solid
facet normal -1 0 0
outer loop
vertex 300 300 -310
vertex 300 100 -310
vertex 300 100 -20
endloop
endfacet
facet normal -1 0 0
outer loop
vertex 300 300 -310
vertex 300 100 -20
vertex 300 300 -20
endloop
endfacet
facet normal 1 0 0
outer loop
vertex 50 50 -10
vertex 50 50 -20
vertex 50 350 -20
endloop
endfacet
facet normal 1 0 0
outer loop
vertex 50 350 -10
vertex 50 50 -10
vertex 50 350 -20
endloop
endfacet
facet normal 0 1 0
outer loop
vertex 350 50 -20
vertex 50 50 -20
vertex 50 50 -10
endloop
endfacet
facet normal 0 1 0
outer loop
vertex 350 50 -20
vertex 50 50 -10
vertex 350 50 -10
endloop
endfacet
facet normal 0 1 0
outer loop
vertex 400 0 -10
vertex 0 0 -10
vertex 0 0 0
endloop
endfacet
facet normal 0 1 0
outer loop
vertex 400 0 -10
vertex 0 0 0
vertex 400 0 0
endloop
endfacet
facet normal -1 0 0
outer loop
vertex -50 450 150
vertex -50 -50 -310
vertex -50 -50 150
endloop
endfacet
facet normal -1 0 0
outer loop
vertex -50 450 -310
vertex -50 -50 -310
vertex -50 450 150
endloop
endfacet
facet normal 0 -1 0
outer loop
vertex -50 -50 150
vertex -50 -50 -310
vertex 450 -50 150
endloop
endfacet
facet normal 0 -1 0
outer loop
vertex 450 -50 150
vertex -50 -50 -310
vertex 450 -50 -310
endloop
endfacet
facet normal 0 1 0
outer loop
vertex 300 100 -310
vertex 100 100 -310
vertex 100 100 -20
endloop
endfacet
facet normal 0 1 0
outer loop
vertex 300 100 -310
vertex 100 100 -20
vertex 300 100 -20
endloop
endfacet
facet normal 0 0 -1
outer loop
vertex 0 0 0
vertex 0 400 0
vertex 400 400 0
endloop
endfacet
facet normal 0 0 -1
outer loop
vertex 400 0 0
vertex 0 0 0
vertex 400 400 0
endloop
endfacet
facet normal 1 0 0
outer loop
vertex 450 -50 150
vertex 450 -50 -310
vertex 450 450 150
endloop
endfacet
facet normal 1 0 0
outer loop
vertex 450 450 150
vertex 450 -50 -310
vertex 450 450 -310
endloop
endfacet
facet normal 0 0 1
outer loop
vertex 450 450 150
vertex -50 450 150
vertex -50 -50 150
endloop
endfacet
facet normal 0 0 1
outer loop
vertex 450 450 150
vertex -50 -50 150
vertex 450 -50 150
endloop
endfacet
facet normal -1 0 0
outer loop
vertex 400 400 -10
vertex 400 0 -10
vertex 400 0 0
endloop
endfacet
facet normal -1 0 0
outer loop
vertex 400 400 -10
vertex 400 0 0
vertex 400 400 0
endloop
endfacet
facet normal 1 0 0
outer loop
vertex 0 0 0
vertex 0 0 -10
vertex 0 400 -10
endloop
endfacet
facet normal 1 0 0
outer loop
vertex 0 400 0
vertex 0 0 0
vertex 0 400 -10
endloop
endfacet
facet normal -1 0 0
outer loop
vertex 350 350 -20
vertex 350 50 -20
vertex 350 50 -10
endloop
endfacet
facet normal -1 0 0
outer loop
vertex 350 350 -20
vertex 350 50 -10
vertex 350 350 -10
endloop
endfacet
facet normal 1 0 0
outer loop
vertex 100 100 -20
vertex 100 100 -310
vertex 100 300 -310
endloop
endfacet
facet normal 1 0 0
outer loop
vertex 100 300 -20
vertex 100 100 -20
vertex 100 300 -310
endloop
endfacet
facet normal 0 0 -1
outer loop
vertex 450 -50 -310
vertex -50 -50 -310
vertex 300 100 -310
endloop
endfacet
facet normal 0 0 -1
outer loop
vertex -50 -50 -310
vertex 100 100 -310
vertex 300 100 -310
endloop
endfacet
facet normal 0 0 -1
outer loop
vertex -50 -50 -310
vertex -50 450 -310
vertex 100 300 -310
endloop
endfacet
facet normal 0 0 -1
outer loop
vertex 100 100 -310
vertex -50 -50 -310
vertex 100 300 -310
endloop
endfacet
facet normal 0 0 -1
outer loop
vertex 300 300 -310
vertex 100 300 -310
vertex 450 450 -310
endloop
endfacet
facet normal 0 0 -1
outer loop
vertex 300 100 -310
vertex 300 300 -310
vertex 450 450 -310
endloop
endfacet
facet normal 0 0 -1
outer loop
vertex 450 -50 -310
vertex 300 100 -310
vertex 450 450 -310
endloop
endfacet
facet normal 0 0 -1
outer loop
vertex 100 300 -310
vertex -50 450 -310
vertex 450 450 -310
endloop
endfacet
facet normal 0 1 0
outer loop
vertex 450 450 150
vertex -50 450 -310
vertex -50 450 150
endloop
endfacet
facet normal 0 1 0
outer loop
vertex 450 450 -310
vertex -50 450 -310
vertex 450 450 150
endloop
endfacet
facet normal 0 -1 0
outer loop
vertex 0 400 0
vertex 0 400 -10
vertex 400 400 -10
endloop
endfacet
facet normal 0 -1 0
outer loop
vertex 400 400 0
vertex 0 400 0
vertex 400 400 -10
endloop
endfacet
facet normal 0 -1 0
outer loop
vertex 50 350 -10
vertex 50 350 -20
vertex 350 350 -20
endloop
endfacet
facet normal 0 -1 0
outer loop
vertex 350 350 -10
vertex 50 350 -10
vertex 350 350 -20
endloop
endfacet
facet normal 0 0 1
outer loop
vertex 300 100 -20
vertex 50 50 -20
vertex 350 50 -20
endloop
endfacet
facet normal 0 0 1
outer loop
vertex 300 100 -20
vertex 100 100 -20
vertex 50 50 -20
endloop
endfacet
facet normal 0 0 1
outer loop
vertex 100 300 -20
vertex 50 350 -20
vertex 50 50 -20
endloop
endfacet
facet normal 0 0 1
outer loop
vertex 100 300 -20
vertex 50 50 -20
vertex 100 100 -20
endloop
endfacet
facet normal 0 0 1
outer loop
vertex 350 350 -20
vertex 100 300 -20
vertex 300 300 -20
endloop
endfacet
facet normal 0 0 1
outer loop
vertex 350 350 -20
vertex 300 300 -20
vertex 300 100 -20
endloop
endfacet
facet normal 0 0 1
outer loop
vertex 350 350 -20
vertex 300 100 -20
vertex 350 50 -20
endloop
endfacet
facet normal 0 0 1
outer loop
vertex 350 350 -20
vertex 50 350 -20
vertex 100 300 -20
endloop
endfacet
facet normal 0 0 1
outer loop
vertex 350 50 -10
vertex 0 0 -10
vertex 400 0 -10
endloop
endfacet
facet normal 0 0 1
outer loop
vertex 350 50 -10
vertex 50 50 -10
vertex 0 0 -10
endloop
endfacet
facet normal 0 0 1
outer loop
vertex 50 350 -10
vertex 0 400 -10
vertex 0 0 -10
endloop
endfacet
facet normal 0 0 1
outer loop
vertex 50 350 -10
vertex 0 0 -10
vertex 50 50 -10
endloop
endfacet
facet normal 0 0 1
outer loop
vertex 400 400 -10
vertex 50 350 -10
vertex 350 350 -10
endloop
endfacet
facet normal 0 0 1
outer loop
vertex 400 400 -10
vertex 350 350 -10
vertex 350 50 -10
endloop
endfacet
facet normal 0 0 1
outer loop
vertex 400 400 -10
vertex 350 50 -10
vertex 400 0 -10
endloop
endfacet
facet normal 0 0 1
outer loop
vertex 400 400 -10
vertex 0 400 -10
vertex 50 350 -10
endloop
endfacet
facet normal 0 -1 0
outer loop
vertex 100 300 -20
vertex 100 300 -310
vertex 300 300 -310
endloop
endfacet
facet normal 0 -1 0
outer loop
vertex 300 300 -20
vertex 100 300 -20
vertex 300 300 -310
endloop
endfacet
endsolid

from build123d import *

# Parameters (mm, degrees)
BOX007_W     = 300
BOX007_H     = 300
BOX007_DEPTH = 10
BOX006_W     = 200
BOX006_H     = 200
BOX006_DEPTH = 300
BOX005_W     = 400
BOX005_H     = 400
BOX005_DEPTH = 300
BOX009_W     = 400
BOX009_H     = 400
BOX009_DEPTH = 410
BOX008_W     = 500
BOX008_H     = 500
BOX008_DEPTH = 460
BOX002_W     = 400
BOX002_H     = 400
BOX002_DEPTH = 100


with BuildPart() as cube006:
    # Box007 → Box007 (new body)
    with BuildSketch(Plane(origin=(50, 50, -20), x_dir=(1, 0, 0), z_dir=(0, 0, 1))):
        with Locations((150, 150)):
            Rectangle(BOX007_W, BOX007_H)
    extrude(amount=BOX007_DEPTH)


with BuildPart() as cube005:
    # Box006 → Box006 (new body)
    with BuildSketch(Plane(origin=(100, 100, -310), x_dir=(1, 0, 0), z_dir=(0, 0, 1))):
        with Locations((100, 100)):
            Rectangle(BOX006_W, BOX006_H)
    extrude(amount=BOX006_DEPTH)


with BuildPart() as cut003:
    # Box005 → Box005 (new body)
    with BuildSketch(Plane.XY.offset(-310)):
        with Locations((200, 200)):
            Rectangle(BOX005_W, BOX005_H)
    extrude(amount=BOX005_DEPTH)

    # Cut002: cut Cube005
    add(cube005.part, mode=Mode.SUBTRACT)

    # Cut003: cut Cube006
    add(cube006.part, mode=Mode.SUBTRACT)


with BuildPart() as cube008:
    # Box009 → Box009 (new body)
    with BuildSketch(Plane.XY.offset(-310)):
        with Locations((200, 200)):
            Rectangle(BOX009_W, BOX009_H)
    extrude(amount=BOX009_DEPTH)


with BuildPart() as cut004:
    # Box008 → Box008 (new body)
    with BuildSketch(Plane(origin=(-50, -50, -310), x_dir=(1, 0, 0), z_dir=(0, 0, 1))):
        with Locations((250, 250)):
            Rectangle(BOX008_W, BOX008_H)
    extrude(amount=BOX008_DEPTH)

    # Cut004: cut Cube008
    add(cube008.part, mode=Mode.SUBTRACT)


with BuildPart() as pb_block:
    # Box002 → Box002 (new body)
    with BuildSketch(Plane.XY):
        with Locations((200, 200)):
            Rectangle(BOX002_W, BOX002_H)
    extrude(amount=BOX002_DEPTH)

    # Fusion001: union Cut003, Cut004
    add(cut003.part)
    add(cut004.part)


solid = pb_block.part
